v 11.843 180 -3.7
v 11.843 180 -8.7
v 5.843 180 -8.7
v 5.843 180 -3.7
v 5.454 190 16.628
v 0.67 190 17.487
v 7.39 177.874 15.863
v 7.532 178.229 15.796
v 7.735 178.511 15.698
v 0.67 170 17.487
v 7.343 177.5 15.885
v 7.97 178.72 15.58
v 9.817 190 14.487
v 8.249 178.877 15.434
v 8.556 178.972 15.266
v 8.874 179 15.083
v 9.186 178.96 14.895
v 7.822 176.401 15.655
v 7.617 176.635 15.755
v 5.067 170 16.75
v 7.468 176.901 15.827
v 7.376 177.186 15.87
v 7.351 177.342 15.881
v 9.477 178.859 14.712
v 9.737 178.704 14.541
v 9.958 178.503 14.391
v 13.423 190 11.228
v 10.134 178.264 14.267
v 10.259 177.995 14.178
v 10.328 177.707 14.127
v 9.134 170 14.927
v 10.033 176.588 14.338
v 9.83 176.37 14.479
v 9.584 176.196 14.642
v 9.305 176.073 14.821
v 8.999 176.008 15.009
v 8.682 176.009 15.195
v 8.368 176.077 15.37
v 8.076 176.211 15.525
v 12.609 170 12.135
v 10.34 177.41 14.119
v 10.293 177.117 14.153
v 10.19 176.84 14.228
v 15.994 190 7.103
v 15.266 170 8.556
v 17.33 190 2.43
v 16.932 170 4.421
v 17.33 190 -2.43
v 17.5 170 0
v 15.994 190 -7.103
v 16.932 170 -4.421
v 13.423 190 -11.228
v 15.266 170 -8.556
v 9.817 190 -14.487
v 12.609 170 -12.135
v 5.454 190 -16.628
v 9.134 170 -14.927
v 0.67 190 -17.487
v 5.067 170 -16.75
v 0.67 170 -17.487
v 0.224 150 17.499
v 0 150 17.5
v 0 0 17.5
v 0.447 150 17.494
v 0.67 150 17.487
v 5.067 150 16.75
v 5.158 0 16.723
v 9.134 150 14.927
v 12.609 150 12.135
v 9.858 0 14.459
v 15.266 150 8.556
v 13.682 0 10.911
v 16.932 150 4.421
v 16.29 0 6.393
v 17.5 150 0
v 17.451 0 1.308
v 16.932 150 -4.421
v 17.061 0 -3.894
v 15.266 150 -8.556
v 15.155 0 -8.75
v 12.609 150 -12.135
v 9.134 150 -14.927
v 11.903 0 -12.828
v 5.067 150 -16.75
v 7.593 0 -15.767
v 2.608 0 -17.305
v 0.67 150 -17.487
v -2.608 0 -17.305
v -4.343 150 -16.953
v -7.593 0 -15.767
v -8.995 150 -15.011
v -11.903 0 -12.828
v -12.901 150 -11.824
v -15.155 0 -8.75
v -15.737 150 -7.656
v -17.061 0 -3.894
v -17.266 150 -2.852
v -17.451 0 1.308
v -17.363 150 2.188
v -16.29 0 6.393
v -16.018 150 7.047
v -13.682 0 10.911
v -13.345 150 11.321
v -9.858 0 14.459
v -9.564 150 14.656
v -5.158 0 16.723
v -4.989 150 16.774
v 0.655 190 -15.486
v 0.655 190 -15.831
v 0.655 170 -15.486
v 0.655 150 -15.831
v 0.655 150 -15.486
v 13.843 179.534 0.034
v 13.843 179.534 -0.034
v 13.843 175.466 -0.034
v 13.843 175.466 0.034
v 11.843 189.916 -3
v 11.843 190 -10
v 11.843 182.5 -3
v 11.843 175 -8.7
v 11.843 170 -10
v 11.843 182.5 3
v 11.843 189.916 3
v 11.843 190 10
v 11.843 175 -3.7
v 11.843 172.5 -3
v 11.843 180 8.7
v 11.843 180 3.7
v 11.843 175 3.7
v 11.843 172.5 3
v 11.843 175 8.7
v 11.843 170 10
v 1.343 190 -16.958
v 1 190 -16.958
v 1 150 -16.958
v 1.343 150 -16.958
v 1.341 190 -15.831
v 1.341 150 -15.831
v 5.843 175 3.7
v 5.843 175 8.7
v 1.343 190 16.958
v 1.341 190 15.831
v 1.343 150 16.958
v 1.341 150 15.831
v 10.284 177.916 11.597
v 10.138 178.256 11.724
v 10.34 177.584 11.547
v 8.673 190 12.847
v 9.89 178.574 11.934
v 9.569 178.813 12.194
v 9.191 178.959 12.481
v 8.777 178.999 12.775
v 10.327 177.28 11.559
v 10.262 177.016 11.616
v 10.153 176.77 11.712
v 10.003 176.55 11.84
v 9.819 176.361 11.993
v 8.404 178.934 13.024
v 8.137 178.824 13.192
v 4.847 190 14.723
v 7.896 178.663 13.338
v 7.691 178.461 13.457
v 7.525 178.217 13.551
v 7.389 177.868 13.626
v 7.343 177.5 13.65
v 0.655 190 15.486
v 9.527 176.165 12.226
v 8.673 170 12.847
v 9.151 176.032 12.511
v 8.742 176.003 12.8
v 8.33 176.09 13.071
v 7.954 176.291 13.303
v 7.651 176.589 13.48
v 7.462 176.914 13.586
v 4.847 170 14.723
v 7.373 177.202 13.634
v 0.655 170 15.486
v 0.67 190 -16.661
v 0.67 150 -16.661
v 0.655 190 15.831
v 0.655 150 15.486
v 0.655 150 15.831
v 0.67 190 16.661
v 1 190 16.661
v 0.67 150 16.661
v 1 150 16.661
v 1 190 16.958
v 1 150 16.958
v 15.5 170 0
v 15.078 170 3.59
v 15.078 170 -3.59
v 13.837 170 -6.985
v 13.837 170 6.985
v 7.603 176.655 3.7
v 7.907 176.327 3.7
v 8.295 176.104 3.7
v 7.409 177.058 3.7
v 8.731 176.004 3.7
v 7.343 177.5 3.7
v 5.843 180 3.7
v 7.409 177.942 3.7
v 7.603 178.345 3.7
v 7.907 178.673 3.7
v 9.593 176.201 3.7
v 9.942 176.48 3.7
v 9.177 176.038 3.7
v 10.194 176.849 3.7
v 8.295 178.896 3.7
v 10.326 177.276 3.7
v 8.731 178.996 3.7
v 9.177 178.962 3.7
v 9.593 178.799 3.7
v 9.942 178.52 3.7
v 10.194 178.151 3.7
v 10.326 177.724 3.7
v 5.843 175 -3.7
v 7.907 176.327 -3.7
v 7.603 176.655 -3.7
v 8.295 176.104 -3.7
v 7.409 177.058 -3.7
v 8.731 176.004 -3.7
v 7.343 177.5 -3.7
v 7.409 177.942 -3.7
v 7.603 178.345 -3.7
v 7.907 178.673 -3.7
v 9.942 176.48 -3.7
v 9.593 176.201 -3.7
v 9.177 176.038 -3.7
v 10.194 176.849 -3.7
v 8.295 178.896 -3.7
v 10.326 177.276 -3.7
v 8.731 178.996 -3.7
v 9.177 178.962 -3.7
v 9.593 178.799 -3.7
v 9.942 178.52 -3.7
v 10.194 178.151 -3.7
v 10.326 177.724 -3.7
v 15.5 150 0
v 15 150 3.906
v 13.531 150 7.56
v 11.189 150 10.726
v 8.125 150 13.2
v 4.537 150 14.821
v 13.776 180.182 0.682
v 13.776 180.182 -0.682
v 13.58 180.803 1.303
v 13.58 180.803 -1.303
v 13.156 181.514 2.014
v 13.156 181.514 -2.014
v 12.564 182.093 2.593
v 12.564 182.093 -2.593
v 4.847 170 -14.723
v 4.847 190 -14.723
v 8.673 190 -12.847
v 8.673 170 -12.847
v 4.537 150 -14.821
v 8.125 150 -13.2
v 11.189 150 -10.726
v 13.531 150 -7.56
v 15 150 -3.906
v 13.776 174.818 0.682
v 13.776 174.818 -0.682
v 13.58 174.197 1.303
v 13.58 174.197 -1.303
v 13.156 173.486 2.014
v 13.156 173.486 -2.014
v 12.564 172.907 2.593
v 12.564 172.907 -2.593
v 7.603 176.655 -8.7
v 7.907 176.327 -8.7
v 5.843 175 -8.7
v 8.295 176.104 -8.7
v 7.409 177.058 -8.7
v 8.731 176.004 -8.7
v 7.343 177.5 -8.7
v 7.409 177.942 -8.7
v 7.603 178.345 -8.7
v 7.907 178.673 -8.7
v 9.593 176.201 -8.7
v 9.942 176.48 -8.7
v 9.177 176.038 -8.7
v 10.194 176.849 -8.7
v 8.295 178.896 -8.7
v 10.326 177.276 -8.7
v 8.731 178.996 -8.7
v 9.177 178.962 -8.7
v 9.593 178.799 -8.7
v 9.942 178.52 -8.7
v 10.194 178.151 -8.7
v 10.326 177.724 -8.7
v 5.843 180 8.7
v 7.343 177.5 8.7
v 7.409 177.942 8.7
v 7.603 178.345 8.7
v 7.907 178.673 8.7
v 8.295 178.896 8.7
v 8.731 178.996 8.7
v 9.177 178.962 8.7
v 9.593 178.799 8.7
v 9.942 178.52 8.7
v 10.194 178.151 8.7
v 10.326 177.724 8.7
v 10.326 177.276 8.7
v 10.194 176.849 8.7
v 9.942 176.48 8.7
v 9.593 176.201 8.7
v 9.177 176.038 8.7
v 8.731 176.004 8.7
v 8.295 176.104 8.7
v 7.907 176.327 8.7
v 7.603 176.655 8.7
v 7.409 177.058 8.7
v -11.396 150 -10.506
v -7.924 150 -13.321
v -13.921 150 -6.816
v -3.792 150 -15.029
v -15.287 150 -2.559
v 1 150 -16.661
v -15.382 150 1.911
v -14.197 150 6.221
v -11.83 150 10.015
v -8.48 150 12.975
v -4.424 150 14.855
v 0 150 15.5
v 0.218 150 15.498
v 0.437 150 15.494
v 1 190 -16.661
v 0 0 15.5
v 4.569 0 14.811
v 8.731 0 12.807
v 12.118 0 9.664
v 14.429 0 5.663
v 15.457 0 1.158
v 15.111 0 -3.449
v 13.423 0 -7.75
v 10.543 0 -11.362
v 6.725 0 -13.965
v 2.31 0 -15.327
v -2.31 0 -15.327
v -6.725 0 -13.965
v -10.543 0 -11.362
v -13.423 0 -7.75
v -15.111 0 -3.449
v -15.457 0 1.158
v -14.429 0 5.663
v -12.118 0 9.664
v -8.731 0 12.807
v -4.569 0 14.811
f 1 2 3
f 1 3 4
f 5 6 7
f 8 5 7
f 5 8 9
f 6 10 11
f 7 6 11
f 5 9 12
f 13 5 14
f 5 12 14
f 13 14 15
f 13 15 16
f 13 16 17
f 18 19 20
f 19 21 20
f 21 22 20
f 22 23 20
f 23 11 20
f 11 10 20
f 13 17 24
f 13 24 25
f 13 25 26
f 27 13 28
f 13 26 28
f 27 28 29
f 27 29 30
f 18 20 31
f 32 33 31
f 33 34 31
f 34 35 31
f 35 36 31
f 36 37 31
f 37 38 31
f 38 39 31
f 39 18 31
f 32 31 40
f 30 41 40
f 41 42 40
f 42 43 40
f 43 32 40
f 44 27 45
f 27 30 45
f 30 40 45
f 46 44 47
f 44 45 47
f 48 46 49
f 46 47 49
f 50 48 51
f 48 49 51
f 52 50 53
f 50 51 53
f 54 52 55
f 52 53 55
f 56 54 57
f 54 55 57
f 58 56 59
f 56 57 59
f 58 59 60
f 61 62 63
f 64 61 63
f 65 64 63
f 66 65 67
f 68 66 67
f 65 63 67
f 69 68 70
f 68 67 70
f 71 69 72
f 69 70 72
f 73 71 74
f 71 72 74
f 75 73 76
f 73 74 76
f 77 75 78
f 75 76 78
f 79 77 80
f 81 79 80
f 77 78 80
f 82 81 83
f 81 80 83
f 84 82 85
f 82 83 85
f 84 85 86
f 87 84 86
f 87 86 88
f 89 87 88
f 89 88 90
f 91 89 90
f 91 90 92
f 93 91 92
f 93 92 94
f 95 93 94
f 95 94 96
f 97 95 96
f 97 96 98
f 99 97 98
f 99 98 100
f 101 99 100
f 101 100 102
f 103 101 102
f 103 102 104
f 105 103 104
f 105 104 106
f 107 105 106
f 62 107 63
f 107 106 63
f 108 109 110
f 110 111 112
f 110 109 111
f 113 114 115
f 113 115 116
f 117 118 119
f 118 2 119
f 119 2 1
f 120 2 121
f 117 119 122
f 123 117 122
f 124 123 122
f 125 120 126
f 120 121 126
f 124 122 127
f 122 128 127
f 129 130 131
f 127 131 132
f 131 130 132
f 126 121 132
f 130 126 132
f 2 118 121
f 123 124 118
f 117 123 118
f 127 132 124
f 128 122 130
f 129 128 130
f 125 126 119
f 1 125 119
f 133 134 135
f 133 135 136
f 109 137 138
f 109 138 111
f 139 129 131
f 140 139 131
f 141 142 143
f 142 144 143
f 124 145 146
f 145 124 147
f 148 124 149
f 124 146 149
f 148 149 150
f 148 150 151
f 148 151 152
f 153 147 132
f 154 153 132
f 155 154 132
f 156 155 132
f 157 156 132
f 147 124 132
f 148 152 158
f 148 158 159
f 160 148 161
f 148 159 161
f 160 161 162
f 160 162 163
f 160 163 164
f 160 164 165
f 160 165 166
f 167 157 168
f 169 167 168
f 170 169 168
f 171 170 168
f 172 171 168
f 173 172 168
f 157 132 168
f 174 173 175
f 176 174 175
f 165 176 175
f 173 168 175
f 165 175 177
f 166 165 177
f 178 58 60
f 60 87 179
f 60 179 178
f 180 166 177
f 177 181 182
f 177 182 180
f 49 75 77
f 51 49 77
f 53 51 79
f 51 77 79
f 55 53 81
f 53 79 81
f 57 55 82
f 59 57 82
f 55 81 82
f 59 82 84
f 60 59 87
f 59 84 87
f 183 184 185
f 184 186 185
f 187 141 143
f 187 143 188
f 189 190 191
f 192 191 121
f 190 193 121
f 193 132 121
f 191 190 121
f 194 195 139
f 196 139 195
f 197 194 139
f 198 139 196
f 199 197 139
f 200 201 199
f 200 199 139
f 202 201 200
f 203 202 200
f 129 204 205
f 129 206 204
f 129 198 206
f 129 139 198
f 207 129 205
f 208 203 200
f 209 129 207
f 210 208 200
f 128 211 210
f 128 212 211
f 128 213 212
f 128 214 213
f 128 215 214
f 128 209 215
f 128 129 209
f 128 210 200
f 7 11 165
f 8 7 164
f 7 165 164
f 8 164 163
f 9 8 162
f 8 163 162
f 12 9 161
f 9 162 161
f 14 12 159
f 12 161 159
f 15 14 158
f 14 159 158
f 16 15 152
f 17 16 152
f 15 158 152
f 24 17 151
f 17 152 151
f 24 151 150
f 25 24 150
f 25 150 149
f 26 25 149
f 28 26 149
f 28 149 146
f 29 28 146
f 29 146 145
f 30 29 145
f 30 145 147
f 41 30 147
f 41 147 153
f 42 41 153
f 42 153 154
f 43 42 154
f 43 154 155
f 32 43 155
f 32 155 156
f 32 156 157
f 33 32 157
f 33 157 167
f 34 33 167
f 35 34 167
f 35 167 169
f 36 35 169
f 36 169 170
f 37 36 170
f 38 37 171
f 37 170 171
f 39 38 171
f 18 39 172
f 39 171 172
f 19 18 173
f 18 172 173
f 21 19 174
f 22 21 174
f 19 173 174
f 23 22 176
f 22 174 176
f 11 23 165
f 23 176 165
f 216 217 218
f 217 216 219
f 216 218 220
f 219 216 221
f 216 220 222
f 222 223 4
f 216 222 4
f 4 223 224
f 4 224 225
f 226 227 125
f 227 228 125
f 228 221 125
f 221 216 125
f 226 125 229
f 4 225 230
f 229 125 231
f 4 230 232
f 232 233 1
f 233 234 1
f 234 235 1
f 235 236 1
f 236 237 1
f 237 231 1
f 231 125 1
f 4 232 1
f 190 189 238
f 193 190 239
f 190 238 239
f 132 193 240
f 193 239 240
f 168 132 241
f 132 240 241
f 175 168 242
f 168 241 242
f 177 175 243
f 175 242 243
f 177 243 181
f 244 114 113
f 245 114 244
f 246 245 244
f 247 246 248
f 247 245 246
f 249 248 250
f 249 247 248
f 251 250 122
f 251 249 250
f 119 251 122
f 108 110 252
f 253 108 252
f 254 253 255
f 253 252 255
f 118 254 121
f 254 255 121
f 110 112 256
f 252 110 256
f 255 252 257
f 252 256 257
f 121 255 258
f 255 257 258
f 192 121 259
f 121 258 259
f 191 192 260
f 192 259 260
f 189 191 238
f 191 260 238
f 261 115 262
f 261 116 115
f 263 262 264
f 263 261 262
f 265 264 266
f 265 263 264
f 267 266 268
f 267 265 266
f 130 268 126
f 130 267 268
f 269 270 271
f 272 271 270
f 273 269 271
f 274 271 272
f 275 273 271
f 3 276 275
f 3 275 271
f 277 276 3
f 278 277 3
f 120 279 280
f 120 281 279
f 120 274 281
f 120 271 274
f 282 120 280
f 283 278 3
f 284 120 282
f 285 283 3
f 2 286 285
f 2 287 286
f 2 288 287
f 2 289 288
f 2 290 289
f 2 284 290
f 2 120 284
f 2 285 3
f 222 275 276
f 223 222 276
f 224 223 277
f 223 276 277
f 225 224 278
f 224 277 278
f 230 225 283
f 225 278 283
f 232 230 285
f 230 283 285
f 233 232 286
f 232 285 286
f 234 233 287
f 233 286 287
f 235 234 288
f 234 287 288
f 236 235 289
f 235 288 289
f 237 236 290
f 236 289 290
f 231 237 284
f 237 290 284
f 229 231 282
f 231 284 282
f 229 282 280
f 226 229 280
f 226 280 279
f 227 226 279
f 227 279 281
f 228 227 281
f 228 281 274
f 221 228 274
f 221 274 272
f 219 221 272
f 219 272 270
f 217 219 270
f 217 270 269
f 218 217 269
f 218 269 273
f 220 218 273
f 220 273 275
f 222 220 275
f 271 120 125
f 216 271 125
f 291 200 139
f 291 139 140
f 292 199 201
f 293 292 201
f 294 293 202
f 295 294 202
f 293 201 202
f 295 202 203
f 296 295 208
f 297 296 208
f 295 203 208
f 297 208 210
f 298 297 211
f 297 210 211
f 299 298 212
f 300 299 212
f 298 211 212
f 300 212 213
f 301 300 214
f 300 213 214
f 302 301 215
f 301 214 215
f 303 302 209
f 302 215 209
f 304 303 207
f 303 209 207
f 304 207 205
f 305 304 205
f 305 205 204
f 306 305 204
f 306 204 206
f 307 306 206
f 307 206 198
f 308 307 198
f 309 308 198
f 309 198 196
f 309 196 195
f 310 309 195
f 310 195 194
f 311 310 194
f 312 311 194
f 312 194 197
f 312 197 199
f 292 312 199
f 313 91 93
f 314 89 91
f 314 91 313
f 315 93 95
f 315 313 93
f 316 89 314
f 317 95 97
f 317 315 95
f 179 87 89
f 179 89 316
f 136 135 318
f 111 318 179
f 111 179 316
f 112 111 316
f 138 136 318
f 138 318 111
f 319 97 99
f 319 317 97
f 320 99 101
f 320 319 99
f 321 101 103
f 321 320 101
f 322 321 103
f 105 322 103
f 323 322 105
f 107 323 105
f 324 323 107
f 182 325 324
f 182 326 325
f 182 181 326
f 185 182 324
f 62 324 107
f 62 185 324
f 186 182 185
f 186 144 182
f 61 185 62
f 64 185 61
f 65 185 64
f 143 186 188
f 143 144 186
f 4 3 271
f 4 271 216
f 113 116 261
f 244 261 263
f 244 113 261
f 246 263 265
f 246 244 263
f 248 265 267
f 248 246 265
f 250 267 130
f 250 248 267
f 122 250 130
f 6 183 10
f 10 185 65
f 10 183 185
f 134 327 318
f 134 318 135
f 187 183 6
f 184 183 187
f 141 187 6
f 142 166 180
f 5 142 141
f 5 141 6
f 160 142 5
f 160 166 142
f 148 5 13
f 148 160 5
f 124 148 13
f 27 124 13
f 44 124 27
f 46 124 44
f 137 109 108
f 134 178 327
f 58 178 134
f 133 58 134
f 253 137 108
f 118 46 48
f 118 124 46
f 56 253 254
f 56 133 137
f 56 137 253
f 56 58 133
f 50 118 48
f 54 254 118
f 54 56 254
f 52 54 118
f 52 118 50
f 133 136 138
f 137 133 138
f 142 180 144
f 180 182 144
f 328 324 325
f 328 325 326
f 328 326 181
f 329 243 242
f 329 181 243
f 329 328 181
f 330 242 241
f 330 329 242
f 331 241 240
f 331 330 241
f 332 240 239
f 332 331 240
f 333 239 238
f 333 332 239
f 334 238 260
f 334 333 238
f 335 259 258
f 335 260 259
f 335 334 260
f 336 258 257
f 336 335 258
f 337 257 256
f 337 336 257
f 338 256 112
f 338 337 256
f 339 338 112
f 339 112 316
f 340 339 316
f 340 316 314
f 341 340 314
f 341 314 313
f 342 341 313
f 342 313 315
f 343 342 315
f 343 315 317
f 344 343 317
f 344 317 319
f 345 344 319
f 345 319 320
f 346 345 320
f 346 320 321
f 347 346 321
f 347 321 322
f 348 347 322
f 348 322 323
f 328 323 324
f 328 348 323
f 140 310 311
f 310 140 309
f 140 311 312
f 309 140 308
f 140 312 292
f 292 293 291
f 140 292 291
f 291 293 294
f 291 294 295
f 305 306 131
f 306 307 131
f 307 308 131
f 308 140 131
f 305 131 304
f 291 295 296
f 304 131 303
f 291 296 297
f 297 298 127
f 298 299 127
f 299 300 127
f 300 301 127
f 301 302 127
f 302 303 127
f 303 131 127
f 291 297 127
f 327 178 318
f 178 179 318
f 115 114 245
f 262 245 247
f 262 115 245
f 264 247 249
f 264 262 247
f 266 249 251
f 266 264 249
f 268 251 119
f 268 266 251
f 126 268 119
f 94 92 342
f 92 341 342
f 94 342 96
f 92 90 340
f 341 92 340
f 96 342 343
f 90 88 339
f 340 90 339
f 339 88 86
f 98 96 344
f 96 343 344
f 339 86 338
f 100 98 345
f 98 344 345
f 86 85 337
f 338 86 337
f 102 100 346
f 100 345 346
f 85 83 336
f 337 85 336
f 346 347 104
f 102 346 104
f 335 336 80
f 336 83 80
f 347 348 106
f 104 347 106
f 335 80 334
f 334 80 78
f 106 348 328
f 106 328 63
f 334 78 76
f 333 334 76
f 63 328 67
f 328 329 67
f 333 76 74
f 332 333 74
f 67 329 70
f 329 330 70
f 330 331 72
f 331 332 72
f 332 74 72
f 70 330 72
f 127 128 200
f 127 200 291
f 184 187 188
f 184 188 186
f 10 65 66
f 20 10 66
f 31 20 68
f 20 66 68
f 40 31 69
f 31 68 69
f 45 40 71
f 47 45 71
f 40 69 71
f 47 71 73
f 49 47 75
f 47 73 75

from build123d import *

# Parameters (mm, degrees)
SKETCH3_R           = 17.5
SKETCH3_R_2         = 15.5
BOSS_EXTRUDE1_DEPTH = 150
BOSS_EXTRUDE2_DEPTH = 20
BOSS_EXTRUDE3_DEPTH = 20
SKETCH6_W           = 5
SKETCH6_H           = 5
BOSS_EXTRUDE4_DEPTH = 6
SKETCH7_R           = 1.5
CUT_EXTRUDE2_DEPTH  = 50
SKETCH9_W           = 6
SKETCH9_H           = 10
CUT_EXTRUDE3_DEPTH  = 2
FILLET3_R           = 3.2


with BuildPart() as part:
    # Sketch3 → Boss-Extrude1 (new body)
    with BuildSketch(Plane(origin=(0, 0, 0), x_dir=(1, 0, 0), z_dir=(0, 1, 0))):
        with Locations(Location((0, 0, 0), (0, 0, 270))):
            Circle(SKETCH3_R)
        with Locations(Location((0, 0, 0), (0, 0, 270))):
            Circle(SKETCH3_R_2, mode=Mode.SUBTRACT)
    extrude(amount=BOSS_EXTRUDE1_DEPTH)

    # Sketch4 → Boss-Extrude2 (add)
    with BuildSketch(Plane(origin=(0, 150, 0), x_dir=(1, 0, 0), z_dir=(0, 1, 0))):
        with BuildLine():
            ThreePointArc((17.5, 0), (12.609164887, 12.135030319), (0.670404475, 17.487154081))
            Line((0.670404475, 17.487154081), (0.670404475, 16.661380915))
            Line((0.670404475, 16.661380915), (0.999793375, 16.661380915))
            Line((0.999793375, 16.661380915), (0.999793375, 16.95829018))
            Line((0.999793375, 16.95829018), (1.342992881, 16.95829018))
            Line((1.342992881, 16.95829018), (1.340586782, 15.830625123))
            Line((1.340586782, 15.830625123), (0.65523527, 15.830625123))
            Line((0.65523527, 15.830625123), (0.65523527, 15.486144347))
            ThreePointArc((0.65523527, 15.486144347), (11.189417918, 10.725993038), (15.5, 0))
            Line((15.5, 0), (17.5, 0))
        make_face()
        with BuildLine():
            ThreePointArc((0.670404475, -17.487154081), (12.609164887, -12.135030319), (17.5, 0))
            Line((17.5, 0), (15.5, 0))
            ThreePointArc((15.5, 0), (11.189417918, -10.725993038), (0.65523527, -15.486144347))
            Line((0.65523527, -15.486144347), (0.65523527, -15.830625123))
            Line((0.65523527, -15.830625123), (1.340586782, -15.830625123))
            Line((1.340586782, -15.830625123), (1.342992881, -16.95829018))
            Line((1.342992881, -16.95829018), (0.999793375, -16.95829018))
            Line((0.999793375, -16.95829018), (0.999793375, -16.661380915))
            Line((0.999793375, -16.661380915), (0.670404475, -16.661380915))
            Line((0.670404475, -16.661380915), (0.670404475, -17.487154081))
        make_face()
    extrude(amount=BOSS_EXTRUDE2_DEPTH)

    # Sketch5 → Boss-Extrude3 (add)
    with BuildSketch(Plane(origin=(0, 170, 0), x_dir=(1, 0, 0), z_dir=(0, 1, 0))):
        with BuildLine():
            Line((0.65523527, 15.830625123), (0.65523527, 15.486144347))
            ThreePointArc((0.65523527, 15.486144347), (15.5, 0), (0.65523527, -15.486144347))
            Line((0.65523527, -15.486144347), (0.65523527, -15.830625123))
            Line((0.65523527, -15.830625123), (1.340586782, -15.830625123))
            Line((1.340586782, -15.830625123), (1.342992881, -16.95829018))
            Line((1.342992881, -16.95829018), (0.999793375, -16.95829018))
            Line((0.999793375, -16.95829018), (0.999793375, -16.661380915))
            Line((0.999793375, -16.661380915), (0.670404475, -16.661380915))
            Line((0.670404475, -16.661380915), (0.670404475, -17.487154081))
            ThreePointArc((0.670404475, -17.487154081), (17.5, 0), (0.670404475, 17.487154081))
            Line((0.670404475, 17.487154081), (0.670404475, 16.661380915))
            Line((0.670404475, 16.661380915), (0.999793375, 16.661380915))
            Line((0.999793375, 16.661380915), (0.999793375, 16.95829018))
            Line((0.999793375, 16.95829018), (1.342992881, 16.95829018))
            Line((1.342992881, 16.95829018), (1.340586782, 15.830625123))
            Line((1.340586782, 15.830625123), (0.65523527, 15.830625123))
        make_face()
        with BuildLine():
            ThreePointArc((11.842719282, -10), (15.5, 0), (11.842719282, 10))
            Line((11.842719282, 10), (11.842719282, -10))
        make_face()
    extrude(amount=BOSS_EXTRUDE3_DEPTH)

    # Sketch6 → Boss-Extrude4 (add)
    with BuildSketch(Plane.ZY.offset(-11.842719282)):
        with Locations((-6.2, 177.5)):
            Rectangle(SKETCH6_W, SKETCH6_H)
        with Locations((6.2, 177.5)):
            Rectangle(SKETCH6_W, SKETCH6_H)
    extrude(amount=BOSS_EXTRUDE4_DEPTH)

    # Sketch7 → Cut-Extrude2 (cut)
    with BuildSketch(Plane(origin=(0, 0, -8.7), x_dir=(-1, 0, 0), z_dir=(0, 0, -1))):
        with Locations((-8.842719282, 177.5)):
            Circle(SKETCH7_R)
    extrude(amount=-CUT_EXTRUDE2_DEPTH, mode=Mode.SUBTRACT)

    # Sketch9 → Cut-Extrude3 (cut)
    with BuildSketch(Plane.ZY.offset(-11.842719282)):
        with Locations((0, 177.5)):
            Rectangle(SKETCH9_W, SKETCH9_H)
    extrude(amount=-CUT_EXTRUDE3_DEPTH, mode=Mode.SUBTRACT)

    # Fillet3
    # the kernel refuses this fillet: 3.2 mm, written as the material it adds along each edge
    with BuildSketch(Plane(origin=(13.842719282, 172.5, -3), x_dir=(-1, 0, 0), z_dir=(0, 1, 0)), Plane(origin=(13.842719282, 189.916198487, 3), x_dir=(-1, 0, 0), z_dir=(0, -1, 0))) as fillet3_piece_1:
        with BuildLine():
            CenterArc((3.2, 2.966479395), FILLET3_R, 180, 67.975687163)
            Line((0, 2.966479395), (-0.064, 2.966479395))
            Line((-0.064, 2.966479395), (-0.064, 0))
            Line((-0.064, 0), (0, -0.064))
            ThreePointArc((0, -0.064), (1, -0.064), (1.976, -0.059329588))
            Line((1.976, -0.059329588), (2, 0))
        make_face()
    extrude(amount=17.416198487)
    with BuildSketch(Plane(origin=(13.842719282, 172.5, 10.416198487), x_dir=(-1, 0, 0), z_dir=(0, 0, -1)), Plane(origin=(13.842719282, 182.5, -10.416198487), x_dir=(-1, 0, 0), z_dir=(0, 0, 1))) as fillet3_piece_2:
        with BuildLine():
            CenterArc((3.2, 2.966479395), FILLET3_R, 180, 67.975687163)
            Line((0, 2.966479395), (-0.064, 2.966479395))
            Line((-0.064, 2.966479395), (-0.064, 0))
            Line((-0.064, 0), (0, -0.064))
            ThreePointArc((0, -0.064), (1, -0.064), (1.976, -0.059329588))
            Line((1.976, -0.059329588), (2, 0))
        make_face()
    extrude(amount=20.832396974)


solid = part.part
